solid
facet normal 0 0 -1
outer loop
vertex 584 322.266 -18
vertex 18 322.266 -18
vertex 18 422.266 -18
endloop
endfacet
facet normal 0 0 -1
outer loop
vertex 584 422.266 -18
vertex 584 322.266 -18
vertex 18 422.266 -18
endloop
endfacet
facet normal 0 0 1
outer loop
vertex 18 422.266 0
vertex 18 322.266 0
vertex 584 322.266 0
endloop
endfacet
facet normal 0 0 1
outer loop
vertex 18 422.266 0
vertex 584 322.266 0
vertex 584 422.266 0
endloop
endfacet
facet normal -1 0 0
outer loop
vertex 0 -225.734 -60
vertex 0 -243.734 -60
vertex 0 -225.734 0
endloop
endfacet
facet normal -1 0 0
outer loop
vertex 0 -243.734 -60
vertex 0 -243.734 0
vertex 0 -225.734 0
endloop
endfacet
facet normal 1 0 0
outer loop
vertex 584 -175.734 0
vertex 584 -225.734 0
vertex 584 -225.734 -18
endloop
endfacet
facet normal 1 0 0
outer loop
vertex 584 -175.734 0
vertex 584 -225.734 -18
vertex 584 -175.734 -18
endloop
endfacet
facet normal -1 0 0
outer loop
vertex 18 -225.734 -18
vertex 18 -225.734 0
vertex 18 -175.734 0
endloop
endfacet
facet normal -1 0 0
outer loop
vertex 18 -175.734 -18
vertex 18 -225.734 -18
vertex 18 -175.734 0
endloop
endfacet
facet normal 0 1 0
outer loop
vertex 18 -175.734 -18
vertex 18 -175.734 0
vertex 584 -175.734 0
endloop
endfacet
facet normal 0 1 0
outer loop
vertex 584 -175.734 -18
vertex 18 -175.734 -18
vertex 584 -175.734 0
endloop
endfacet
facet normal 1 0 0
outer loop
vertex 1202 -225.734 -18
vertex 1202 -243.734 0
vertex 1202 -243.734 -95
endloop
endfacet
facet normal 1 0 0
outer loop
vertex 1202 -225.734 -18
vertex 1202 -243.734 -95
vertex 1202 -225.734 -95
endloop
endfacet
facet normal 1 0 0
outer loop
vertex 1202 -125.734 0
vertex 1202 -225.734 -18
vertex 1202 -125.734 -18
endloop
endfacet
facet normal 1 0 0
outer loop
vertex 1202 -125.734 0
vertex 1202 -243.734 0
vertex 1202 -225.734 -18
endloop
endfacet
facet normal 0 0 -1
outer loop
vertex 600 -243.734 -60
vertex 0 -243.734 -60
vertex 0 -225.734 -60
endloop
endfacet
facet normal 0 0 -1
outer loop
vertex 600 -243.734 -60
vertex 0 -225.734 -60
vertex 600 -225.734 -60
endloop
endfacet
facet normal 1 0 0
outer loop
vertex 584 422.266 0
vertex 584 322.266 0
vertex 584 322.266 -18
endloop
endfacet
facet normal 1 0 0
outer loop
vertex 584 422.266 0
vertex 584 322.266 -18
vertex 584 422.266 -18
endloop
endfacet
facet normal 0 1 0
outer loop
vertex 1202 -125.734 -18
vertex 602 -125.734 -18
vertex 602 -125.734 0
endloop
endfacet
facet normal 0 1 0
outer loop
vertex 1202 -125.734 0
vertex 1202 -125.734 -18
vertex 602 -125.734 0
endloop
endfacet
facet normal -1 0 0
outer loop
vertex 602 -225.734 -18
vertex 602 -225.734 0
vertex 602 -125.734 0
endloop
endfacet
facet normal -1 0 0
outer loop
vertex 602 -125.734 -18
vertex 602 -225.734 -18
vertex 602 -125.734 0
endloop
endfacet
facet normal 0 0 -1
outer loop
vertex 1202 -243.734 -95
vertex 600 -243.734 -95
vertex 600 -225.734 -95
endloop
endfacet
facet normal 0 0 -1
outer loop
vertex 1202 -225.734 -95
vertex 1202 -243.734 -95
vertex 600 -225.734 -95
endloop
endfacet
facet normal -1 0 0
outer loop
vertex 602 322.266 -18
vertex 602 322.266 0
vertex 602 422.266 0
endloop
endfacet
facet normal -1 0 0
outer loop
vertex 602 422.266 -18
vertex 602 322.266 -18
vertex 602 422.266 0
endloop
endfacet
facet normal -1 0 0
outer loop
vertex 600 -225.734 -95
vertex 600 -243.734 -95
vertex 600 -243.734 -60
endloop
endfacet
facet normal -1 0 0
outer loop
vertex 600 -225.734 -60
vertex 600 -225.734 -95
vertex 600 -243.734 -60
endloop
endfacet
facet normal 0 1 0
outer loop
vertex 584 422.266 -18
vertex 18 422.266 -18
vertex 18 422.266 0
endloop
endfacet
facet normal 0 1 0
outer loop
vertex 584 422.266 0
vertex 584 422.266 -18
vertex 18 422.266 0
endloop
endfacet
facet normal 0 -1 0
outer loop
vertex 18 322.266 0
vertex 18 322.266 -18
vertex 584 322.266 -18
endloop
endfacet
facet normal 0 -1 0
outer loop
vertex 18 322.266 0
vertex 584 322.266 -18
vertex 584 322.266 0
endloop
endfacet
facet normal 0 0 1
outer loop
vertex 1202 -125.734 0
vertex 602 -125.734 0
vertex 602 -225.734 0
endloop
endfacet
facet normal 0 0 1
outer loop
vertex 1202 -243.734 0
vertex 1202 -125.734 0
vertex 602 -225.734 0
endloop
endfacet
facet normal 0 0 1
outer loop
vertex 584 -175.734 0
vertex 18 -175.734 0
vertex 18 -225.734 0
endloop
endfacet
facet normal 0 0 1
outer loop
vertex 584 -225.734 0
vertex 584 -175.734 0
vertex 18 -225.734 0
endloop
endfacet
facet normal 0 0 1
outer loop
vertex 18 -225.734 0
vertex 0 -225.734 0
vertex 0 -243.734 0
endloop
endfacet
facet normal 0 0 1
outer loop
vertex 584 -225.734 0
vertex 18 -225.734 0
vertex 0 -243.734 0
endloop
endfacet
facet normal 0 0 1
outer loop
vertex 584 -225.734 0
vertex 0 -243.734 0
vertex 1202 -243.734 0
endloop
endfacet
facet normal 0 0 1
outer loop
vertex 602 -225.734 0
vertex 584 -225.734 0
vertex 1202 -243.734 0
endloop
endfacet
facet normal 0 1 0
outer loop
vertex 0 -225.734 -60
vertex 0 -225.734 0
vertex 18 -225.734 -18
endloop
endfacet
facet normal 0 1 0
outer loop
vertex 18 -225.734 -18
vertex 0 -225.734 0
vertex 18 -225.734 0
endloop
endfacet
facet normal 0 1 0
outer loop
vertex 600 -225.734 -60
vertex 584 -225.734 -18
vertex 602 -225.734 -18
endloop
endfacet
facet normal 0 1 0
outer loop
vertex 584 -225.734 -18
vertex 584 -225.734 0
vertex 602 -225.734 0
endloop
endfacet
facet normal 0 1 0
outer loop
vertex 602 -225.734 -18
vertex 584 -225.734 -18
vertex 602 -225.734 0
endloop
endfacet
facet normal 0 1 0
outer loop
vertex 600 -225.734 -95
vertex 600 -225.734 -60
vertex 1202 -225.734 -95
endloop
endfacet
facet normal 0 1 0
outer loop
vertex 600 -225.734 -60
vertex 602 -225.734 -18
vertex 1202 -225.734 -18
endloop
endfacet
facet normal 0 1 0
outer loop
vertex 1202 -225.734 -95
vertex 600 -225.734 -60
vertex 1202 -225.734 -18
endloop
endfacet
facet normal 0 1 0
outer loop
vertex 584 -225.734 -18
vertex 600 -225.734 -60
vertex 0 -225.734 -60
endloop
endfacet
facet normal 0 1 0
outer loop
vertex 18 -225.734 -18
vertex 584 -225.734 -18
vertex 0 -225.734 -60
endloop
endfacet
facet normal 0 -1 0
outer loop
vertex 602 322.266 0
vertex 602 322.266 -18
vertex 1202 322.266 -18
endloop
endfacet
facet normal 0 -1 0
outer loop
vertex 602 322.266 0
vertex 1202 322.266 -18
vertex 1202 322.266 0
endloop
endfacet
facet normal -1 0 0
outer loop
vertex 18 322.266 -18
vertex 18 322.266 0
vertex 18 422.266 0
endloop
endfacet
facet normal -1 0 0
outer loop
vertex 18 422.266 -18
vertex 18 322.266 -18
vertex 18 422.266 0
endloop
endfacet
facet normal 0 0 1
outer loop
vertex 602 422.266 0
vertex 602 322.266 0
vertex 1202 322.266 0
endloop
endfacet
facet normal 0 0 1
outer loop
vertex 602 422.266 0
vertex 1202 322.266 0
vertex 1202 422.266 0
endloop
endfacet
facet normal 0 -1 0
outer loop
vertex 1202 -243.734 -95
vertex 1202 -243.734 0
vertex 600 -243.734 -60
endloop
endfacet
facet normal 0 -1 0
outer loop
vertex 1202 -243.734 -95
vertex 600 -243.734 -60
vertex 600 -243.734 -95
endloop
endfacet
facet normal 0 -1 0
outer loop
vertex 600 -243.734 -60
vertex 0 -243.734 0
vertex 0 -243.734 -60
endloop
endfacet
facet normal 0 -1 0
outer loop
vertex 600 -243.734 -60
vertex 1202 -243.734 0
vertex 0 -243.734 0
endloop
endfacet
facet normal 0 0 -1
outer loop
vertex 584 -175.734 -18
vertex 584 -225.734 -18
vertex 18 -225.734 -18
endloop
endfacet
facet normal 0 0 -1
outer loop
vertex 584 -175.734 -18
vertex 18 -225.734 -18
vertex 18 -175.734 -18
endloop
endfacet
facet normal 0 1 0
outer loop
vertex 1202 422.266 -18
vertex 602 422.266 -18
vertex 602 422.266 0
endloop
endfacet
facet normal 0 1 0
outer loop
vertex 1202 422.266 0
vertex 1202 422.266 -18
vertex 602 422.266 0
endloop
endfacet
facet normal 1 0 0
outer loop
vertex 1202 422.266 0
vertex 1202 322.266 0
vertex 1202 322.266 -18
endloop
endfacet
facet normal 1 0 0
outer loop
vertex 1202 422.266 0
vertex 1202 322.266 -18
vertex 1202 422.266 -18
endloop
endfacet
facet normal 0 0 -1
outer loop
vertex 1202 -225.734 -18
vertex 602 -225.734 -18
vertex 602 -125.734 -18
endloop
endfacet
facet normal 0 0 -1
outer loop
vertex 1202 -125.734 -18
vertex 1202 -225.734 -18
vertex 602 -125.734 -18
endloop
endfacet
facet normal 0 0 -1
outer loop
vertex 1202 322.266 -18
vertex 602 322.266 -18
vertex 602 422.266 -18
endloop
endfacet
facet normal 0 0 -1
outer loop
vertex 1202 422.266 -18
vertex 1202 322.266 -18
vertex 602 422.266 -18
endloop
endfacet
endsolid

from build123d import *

# Parameters (mm, degrees)
F0_W     = 100
F0_H     = 18
F1_DEPTH = 1202
F2_W     = 18
F2_H     = 648
F3_DEPTH = 95
F4_W     = 600
F4_H     = 35
F5_DEPTH = 25
F6_W     = 18
F6_H     = 50
F6_W_2   = 566
F6_W_3   = 39.871224
F7_DEPTH = 18


with BuildPart() as f1:
    # F0 (on Right) → F1 (new body)
    with BuildSketch(Plane.YZ):
        with Locations((372.265983, -9)):
            Rectangle(F0_W, F0_H)
        Polygon((-125.734017, -18), (-125.734017, 0), (-243.734017, 0), (-243.734017, -95), (-225.734017, -95), (-225.734017, -18), align=None)
    extrude(amount=F1_DEPTH)

    # F2 (on face) → F3 (cut)
    with BuildSketch(Plane.XY):
        with Locations((593, 98.265983)):
            Rectangle(F2_W, F2_H)
        with Locations((9, 98.265983)):
            Rectangle(F2_W, F2_H)
    extrude(amount=-F3_DEPTH, mode=Mode.SUBTRACT)

    # F4 (on face) → F5 (cut)
    with BuildSketch(Plane.XZ.offset(243.734017)):
        with Locations((300, -77.5)):
            Rectangle(F4_W, F4_H)
    extrude(amount=-F5_DEPTH, mode=Mode.SUBTRACT)

    # F6 (on face) → F7 (cut)
    with BuildSketch(Plane.XY):
        with Locations((593, -150.734017)):
            Rectangle(F6_W, F6_H)
        with Locations((301, -150.734017)):
            Rectangle(F6_W_2, F6_H)
        with Locations((-1.935612, -150.734017)):
            Rectangle(F6_W_3, F6_H)
    extrude(amount=-F7_DEPTH, mode=Mode.SUBTRACT)


solid = f1.part
